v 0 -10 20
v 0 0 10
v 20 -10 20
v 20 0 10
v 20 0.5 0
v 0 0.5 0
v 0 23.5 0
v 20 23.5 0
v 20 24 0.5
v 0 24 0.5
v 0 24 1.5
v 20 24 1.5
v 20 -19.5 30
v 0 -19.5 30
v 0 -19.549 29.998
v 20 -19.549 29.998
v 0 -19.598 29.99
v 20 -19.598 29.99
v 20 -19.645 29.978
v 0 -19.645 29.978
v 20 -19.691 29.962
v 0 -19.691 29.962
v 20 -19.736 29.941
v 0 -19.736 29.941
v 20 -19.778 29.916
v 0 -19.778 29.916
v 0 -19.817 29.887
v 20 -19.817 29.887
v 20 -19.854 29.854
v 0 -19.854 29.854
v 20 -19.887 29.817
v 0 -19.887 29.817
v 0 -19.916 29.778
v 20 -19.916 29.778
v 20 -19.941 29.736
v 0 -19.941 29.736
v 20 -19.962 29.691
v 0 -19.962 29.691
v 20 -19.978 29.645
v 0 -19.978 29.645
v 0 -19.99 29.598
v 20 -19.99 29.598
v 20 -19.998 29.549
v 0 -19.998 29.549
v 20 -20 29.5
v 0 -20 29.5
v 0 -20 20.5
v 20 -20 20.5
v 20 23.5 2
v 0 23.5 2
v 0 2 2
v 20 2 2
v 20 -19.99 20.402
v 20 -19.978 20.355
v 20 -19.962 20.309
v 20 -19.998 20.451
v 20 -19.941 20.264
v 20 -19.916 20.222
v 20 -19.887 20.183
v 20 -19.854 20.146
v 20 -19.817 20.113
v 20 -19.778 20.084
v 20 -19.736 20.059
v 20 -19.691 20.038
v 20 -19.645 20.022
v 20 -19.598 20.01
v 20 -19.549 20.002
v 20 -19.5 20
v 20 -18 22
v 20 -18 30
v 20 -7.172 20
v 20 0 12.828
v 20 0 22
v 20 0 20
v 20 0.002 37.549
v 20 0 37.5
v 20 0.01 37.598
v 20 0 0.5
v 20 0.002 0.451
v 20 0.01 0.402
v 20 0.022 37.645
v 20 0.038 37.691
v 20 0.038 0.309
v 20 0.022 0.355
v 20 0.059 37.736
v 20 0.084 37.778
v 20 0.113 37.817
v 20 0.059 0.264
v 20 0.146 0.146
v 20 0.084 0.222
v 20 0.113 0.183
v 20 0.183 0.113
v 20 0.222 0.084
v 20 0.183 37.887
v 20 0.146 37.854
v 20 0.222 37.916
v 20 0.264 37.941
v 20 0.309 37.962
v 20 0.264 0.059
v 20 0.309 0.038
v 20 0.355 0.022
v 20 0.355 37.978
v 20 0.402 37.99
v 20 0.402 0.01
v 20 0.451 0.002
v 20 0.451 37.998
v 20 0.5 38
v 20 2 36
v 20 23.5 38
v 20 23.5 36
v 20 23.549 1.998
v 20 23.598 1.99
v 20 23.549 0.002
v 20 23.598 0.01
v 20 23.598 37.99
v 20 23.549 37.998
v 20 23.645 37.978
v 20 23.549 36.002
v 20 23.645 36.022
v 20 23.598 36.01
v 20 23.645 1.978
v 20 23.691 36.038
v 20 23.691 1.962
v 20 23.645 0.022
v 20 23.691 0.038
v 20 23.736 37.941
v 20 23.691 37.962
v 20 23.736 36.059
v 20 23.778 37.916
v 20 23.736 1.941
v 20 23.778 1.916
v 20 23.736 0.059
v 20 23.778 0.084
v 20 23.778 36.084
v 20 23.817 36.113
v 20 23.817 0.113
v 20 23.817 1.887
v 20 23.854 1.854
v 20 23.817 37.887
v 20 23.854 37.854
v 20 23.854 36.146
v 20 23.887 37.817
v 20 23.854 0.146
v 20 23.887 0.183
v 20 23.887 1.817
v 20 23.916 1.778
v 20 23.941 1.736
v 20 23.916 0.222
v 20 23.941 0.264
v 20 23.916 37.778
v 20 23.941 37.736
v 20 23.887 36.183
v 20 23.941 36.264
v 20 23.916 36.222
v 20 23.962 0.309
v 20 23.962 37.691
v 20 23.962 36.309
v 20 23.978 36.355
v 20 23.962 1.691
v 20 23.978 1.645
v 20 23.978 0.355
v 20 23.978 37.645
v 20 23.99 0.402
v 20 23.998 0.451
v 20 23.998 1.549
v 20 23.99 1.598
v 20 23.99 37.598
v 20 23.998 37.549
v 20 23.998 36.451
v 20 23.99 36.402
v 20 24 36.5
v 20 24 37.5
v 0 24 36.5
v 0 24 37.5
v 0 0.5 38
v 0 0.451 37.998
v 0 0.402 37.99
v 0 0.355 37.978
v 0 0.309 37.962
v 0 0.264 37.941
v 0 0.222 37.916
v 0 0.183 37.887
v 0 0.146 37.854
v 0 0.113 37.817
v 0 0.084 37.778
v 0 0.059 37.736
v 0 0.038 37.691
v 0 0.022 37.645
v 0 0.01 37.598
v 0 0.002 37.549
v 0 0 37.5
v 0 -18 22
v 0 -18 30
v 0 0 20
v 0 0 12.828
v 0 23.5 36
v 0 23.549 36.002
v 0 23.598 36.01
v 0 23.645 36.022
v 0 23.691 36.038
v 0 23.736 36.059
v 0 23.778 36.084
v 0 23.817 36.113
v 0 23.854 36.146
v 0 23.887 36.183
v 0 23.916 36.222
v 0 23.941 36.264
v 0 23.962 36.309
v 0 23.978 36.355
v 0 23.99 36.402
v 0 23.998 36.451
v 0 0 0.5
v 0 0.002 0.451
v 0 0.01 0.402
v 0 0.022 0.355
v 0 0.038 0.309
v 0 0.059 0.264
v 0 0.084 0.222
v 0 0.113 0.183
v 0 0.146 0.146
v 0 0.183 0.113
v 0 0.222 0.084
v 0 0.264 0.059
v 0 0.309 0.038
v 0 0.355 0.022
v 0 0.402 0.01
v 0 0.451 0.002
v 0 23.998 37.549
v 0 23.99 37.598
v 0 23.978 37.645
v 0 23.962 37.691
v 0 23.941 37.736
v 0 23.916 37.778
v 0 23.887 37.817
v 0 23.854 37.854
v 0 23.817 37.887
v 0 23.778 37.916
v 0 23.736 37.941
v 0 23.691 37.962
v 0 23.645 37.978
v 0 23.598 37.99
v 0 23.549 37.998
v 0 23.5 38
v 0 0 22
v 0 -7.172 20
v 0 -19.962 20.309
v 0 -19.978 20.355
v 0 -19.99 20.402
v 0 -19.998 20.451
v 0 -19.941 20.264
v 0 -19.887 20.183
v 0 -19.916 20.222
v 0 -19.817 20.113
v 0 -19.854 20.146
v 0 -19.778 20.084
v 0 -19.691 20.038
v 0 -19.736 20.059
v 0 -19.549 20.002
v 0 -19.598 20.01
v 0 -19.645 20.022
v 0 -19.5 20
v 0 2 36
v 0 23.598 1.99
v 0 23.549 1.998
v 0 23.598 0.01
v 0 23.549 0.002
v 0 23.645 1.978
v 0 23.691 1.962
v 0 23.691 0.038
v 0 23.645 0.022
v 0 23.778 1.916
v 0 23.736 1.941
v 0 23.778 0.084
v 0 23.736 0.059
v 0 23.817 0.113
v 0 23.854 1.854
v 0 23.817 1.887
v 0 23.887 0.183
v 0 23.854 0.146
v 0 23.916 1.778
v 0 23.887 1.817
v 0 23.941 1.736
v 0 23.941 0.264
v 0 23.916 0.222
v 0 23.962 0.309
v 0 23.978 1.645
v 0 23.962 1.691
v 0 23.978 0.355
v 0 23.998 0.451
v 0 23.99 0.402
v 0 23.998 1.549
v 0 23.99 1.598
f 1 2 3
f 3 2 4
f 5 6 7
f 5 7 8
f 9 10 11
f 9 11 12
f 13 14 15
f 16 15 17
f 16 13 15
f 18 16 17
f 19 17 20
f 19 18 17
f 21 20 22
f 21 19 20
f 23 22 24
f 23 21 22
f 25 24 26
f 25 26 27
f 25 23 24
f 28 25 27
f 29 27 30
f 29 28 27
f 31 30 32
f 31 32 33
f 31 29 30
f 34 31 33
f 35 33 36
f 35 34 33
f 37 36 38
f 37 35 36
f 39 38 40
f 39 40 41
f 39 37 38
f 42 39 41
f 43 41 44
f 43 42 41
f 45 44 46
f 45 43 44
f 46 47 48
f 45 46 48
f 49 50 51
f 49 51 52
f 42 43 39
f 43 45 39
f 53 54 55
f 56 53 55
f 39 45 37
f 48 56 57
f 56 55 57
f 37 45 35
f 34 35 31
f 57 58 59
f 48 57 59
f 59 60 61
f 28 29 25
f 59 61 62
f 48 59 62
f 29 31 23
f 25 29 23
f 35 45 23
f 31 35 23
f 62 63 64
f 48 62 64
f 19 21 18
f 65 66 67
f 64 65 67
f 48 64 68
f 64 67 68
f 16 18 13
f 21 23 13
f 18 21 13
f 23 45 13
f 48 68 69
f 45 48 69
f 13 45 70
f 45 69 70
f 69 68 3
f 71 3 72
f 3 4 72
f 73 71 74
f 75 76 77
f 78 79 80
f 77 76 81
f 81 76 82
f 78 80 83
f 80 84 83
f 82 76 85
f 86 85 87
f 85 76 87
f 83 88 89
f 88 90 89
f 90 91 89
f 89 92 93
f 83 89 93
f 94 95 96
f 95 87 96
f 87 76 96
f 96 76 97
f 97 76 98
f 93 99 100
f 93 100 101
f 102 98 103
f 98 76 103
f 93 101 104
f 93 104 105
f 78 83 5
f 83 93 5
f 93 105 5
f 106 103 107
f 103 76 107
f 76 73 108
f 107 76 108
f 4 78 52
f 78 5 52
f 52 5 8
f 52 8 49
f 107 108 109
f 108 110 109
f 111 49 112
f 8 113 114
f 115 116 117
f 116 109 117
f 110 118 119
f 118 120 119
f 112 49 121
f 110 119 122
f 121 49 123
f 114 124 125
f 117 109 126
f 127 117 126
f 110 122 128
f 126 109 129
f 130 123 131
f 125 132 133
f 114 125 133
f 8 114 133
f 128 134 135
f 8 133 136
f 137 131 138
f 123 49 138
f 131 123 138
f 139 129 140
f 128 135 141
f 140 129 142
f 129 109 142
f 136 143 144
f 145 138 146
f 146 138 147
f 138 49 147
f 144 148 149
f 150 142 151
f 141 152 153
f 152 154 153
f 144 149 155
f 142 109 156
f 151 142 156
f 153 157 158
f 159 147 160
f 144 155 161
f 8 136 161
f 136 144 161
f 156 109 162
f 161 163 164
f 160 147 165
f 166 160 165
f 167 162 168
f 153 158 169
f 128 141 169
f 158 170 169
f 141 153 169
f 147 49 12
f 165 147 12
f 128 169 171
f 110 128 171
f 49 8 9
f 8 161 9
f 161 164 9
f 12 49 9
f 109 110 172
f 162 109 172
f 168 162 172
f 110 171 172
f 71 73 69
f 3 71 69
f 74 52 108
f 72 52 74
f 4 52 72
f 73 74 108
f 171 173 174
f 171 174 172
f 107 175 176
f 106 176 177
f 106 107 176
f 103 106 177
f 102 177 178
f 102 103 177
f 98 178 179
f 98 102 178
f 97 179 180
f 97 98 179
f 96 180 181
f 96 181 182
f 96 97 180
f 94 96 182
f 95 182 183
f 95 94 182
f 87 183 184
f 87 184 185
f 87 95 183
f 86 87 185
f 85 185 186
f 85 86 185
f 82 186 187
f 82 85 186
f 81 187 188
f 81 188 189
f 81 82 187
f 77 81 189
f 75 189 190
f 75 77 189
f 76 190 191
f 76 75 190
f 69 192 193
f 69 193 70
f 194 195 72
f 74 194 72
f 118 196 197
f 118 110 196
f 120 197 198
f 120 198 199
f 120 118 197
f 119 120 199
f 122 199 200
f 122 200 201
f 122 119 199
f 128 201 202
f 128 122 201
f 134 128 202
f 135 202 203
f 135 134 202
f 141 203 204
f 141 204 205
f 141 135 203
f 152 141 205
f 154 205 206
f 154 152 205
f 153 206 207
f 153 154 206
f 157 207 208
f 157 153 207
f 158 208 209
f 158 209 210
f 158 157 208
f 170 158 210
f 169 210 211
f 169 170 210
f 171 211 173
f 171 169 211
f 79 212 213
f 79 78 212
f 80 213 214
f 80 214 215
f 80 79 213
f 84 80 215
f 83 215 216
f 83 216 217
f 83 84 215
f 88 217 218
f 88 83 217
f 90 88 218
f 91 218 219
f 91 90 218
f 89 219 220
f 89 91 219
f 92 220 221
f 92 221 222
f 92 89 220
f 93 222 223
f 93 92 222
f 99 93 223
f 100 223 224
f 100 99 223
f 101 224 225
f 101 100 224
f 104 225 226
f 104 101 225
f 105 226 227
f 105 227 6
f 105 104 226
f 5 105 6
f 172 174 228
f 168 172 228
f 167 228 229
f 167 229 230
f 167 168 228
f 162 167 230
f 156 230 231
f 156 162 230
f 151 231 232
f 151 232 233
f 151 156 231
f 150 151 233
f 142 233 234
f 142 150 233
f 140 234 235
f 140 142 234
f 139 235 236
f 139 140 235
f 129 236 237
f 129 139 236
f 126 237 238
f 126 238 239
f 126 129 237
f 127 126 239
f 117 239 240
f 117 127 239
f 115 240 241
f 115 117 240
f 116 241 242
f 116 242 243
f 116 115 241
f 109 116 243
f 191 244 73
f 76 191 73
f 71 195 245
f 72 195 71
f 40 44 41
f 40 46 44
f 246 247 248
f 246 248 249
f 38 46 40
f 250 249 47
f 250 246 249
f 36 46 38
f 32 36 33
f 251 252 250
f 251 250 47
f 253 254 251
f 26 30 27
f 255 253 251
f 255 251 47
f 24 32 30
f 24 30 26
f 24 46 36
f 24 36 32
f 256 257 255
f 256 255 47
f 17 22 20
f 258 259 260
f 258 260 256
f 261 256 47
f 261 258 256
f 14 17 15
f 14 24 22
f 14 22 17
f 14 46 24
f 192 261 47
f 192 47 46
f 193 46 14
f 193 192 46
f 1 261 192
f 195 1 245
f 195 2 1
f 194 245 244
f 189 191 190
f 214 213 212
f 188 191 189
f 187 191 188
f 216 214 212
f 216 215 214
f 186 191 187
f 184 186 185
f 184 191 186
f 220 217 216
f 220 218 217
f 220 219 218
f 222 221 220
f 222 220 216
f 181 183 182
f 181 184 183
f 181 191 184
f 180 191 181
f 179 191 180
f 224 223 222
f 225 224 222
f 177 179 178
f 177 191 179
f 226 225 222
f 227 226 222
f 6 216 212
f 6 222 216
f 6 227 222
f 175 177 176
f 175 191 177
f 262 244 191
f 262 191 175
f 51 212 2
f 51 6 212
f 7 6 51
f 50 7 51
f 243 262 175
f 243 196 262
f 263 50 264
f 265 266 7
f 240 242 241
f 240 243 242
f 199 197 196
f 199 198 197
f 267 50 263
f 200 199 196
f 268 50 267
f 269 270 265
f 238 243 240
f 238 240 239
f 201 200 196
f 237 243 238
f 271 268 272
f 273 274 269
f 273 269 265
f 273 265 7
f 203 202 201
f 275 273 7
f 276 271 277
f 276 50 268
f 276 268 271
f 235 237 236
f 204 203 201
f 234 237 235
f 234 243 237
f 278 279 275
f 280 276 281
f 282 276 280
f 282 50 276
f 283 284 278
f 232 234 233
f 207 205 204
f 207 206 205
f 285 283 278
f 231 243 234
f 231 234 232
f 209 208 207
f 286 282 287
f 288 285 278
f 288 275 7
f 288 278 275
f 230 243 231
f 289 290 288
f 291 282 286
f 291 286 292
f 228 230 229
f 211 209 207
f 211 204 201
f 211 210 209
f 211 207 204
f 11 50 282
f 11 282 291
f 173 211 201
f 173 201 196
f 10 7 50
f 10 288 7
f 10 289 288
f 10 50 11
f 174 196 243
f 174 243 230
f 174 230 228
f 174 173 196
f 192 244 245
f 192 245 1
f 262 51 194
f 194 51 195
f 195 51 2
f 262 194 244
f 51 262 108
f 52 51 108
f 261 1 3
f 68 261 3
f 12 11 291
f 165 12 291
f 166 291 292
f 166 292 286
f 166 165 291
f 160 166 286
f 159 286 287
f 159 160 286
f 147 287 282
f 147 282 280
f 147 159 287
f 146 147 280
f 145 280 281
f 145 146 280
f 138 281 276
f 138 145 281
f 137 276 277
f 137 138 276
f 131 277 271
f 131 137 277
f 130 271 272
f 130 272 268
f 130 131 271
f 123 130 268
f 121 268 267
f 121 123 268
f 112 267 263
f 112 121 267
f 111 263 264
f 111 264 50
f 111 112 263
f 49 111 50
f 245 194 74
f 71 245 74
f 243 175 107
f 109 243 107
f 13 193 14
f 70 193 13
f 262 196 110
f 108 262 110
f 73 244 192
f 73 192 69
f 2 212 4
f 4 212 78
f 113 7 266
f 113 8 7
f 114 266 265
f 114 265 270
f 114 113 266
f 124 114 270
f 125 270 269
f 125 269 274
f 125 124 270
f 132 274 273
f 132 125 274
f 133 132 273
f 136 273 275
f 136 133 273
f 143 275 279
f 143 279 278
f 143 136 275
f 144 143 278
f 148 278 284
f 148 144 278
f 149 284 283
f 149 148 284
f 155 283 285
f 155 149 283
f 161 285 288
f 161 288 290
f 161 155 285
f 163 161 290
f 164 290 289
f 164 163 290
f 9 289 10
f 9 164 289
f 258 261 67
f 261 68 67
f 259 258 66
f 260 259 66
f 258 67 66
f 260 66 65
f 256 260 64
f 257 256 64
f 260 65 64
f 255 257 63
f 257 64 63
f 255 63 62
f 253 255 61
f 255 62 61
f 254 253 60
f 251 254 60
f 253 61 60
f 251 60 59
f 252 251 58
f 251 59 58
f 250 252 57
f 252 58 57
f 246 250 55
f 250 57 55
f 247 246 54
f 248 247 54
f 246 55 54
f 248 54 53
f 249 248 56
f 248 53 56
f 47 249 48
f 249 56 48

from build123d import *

# Parameters (mm, degrees)
BOX004_W          = 20
BOX004_H          = 2
BOX004_DEPTH      = 14.5
BOX004_ROLL_ANGLE = 45
BOX001_W          = 20
BOX001_H          = 30
BOX001_DEPTH      = 34
BOX_W             = 20
BOX_H             = 24
BOX_DEPTH         = 38
BOX002_W          = 20
BOX002_H          = 18
BOX002_DEPTH      = 8
BOX003_W          = 20
BOX003_H          = 20
BOX003_DEPTH      = 10
FILLET_R          = 0.5


with BuildPart() as cube004:
    # Box004 → Box004 (new body)
    with BuildSketch(Plane.XY):
        with Locations((10, 1)):
            Rectangle(BOX004_W, BOX004_H)
    extrude(amount=BOX004_DEPTH)


with BuildPart() as cube004_1:
    # Box004 roll: moved
    add(cube004.part.rotate(Axis((0, 0, 0), (1, 0, 0)), BOX004_ROLL_ANGLE))


with BuildPart() as cube004_2:
    # Box004 placement: moved
    add(cube004_1.part.moved(Location((0, 0, 10))))


with BuildPart() as cube001:
    # Box001 → Box001 (new body)
    with BuildSketch(Plane(origin=(0, 2, 2), x_dir=(1, 0, 0), z_dir=(0, 0, 1))):
        with Locations((10, 15)):
            Rectangle(BOX001_W, BOX001_H)
    extrude(amount=BOX001_DEPTH)


with BuildPart() as cut:
    # Box → Box (new body)
    with BuildSketch(Plane.XY):
        with Locations((10, 12)):
            Rectangle(BOX_W, BOX_H)
    extrude(amount=BOX_DEPTH)

    # Cut: cut Cube001
    add(cube001.part, mode=Mode.SUBTRACT)


with BuildPart() as cube002:
    # Box002 → Box002 (new body)
    with BuildSketch(Plane(origin=(0, -18, 22), x_dir=(1, 0, 0), z_dir=(0, 0, 1))):
        with Locations((10, 9)):
            Rectangle(BOX002_W, BOX002_H)
    extrude(amount=BOX002_DEPTH)


with BuildPart() as fillet_body:
    # Box003 → Box003 (new body)
    with BuildSketch(Plane(origin=(0, -20, 20), x_dir=(1, 0, 0), z_dir=(0, 0, 1))):
        with Locations((10, 10)):
            Rectangle(BOX003_W, BOX003_H)
    extrude(amount=BOX003_DEPTH)

    # Cut001: cut Cube002
    add(cube002.part, mode=Mode.SUBTRACT)

    # Fusion: union Cut
    add(cut.part)

    # Fusion001: union Cube004
    add(cube004_2.part)

    # Fillet
    fillet_edges = [fillet_body.edges().sort_by_distance(p)[0] for p in [
        (10, -20, 30),
        (10, -20, 20),
        (10, 0, 38),
        (10, 24, 38),
        (10, 24, 36),
        (10, 24, 2),
        (10, 24, 0),
        (10, 0, 0),
    ]]
    fillet(fillet_edges, radius=FILLET_R)


solid = fillet_body.part
